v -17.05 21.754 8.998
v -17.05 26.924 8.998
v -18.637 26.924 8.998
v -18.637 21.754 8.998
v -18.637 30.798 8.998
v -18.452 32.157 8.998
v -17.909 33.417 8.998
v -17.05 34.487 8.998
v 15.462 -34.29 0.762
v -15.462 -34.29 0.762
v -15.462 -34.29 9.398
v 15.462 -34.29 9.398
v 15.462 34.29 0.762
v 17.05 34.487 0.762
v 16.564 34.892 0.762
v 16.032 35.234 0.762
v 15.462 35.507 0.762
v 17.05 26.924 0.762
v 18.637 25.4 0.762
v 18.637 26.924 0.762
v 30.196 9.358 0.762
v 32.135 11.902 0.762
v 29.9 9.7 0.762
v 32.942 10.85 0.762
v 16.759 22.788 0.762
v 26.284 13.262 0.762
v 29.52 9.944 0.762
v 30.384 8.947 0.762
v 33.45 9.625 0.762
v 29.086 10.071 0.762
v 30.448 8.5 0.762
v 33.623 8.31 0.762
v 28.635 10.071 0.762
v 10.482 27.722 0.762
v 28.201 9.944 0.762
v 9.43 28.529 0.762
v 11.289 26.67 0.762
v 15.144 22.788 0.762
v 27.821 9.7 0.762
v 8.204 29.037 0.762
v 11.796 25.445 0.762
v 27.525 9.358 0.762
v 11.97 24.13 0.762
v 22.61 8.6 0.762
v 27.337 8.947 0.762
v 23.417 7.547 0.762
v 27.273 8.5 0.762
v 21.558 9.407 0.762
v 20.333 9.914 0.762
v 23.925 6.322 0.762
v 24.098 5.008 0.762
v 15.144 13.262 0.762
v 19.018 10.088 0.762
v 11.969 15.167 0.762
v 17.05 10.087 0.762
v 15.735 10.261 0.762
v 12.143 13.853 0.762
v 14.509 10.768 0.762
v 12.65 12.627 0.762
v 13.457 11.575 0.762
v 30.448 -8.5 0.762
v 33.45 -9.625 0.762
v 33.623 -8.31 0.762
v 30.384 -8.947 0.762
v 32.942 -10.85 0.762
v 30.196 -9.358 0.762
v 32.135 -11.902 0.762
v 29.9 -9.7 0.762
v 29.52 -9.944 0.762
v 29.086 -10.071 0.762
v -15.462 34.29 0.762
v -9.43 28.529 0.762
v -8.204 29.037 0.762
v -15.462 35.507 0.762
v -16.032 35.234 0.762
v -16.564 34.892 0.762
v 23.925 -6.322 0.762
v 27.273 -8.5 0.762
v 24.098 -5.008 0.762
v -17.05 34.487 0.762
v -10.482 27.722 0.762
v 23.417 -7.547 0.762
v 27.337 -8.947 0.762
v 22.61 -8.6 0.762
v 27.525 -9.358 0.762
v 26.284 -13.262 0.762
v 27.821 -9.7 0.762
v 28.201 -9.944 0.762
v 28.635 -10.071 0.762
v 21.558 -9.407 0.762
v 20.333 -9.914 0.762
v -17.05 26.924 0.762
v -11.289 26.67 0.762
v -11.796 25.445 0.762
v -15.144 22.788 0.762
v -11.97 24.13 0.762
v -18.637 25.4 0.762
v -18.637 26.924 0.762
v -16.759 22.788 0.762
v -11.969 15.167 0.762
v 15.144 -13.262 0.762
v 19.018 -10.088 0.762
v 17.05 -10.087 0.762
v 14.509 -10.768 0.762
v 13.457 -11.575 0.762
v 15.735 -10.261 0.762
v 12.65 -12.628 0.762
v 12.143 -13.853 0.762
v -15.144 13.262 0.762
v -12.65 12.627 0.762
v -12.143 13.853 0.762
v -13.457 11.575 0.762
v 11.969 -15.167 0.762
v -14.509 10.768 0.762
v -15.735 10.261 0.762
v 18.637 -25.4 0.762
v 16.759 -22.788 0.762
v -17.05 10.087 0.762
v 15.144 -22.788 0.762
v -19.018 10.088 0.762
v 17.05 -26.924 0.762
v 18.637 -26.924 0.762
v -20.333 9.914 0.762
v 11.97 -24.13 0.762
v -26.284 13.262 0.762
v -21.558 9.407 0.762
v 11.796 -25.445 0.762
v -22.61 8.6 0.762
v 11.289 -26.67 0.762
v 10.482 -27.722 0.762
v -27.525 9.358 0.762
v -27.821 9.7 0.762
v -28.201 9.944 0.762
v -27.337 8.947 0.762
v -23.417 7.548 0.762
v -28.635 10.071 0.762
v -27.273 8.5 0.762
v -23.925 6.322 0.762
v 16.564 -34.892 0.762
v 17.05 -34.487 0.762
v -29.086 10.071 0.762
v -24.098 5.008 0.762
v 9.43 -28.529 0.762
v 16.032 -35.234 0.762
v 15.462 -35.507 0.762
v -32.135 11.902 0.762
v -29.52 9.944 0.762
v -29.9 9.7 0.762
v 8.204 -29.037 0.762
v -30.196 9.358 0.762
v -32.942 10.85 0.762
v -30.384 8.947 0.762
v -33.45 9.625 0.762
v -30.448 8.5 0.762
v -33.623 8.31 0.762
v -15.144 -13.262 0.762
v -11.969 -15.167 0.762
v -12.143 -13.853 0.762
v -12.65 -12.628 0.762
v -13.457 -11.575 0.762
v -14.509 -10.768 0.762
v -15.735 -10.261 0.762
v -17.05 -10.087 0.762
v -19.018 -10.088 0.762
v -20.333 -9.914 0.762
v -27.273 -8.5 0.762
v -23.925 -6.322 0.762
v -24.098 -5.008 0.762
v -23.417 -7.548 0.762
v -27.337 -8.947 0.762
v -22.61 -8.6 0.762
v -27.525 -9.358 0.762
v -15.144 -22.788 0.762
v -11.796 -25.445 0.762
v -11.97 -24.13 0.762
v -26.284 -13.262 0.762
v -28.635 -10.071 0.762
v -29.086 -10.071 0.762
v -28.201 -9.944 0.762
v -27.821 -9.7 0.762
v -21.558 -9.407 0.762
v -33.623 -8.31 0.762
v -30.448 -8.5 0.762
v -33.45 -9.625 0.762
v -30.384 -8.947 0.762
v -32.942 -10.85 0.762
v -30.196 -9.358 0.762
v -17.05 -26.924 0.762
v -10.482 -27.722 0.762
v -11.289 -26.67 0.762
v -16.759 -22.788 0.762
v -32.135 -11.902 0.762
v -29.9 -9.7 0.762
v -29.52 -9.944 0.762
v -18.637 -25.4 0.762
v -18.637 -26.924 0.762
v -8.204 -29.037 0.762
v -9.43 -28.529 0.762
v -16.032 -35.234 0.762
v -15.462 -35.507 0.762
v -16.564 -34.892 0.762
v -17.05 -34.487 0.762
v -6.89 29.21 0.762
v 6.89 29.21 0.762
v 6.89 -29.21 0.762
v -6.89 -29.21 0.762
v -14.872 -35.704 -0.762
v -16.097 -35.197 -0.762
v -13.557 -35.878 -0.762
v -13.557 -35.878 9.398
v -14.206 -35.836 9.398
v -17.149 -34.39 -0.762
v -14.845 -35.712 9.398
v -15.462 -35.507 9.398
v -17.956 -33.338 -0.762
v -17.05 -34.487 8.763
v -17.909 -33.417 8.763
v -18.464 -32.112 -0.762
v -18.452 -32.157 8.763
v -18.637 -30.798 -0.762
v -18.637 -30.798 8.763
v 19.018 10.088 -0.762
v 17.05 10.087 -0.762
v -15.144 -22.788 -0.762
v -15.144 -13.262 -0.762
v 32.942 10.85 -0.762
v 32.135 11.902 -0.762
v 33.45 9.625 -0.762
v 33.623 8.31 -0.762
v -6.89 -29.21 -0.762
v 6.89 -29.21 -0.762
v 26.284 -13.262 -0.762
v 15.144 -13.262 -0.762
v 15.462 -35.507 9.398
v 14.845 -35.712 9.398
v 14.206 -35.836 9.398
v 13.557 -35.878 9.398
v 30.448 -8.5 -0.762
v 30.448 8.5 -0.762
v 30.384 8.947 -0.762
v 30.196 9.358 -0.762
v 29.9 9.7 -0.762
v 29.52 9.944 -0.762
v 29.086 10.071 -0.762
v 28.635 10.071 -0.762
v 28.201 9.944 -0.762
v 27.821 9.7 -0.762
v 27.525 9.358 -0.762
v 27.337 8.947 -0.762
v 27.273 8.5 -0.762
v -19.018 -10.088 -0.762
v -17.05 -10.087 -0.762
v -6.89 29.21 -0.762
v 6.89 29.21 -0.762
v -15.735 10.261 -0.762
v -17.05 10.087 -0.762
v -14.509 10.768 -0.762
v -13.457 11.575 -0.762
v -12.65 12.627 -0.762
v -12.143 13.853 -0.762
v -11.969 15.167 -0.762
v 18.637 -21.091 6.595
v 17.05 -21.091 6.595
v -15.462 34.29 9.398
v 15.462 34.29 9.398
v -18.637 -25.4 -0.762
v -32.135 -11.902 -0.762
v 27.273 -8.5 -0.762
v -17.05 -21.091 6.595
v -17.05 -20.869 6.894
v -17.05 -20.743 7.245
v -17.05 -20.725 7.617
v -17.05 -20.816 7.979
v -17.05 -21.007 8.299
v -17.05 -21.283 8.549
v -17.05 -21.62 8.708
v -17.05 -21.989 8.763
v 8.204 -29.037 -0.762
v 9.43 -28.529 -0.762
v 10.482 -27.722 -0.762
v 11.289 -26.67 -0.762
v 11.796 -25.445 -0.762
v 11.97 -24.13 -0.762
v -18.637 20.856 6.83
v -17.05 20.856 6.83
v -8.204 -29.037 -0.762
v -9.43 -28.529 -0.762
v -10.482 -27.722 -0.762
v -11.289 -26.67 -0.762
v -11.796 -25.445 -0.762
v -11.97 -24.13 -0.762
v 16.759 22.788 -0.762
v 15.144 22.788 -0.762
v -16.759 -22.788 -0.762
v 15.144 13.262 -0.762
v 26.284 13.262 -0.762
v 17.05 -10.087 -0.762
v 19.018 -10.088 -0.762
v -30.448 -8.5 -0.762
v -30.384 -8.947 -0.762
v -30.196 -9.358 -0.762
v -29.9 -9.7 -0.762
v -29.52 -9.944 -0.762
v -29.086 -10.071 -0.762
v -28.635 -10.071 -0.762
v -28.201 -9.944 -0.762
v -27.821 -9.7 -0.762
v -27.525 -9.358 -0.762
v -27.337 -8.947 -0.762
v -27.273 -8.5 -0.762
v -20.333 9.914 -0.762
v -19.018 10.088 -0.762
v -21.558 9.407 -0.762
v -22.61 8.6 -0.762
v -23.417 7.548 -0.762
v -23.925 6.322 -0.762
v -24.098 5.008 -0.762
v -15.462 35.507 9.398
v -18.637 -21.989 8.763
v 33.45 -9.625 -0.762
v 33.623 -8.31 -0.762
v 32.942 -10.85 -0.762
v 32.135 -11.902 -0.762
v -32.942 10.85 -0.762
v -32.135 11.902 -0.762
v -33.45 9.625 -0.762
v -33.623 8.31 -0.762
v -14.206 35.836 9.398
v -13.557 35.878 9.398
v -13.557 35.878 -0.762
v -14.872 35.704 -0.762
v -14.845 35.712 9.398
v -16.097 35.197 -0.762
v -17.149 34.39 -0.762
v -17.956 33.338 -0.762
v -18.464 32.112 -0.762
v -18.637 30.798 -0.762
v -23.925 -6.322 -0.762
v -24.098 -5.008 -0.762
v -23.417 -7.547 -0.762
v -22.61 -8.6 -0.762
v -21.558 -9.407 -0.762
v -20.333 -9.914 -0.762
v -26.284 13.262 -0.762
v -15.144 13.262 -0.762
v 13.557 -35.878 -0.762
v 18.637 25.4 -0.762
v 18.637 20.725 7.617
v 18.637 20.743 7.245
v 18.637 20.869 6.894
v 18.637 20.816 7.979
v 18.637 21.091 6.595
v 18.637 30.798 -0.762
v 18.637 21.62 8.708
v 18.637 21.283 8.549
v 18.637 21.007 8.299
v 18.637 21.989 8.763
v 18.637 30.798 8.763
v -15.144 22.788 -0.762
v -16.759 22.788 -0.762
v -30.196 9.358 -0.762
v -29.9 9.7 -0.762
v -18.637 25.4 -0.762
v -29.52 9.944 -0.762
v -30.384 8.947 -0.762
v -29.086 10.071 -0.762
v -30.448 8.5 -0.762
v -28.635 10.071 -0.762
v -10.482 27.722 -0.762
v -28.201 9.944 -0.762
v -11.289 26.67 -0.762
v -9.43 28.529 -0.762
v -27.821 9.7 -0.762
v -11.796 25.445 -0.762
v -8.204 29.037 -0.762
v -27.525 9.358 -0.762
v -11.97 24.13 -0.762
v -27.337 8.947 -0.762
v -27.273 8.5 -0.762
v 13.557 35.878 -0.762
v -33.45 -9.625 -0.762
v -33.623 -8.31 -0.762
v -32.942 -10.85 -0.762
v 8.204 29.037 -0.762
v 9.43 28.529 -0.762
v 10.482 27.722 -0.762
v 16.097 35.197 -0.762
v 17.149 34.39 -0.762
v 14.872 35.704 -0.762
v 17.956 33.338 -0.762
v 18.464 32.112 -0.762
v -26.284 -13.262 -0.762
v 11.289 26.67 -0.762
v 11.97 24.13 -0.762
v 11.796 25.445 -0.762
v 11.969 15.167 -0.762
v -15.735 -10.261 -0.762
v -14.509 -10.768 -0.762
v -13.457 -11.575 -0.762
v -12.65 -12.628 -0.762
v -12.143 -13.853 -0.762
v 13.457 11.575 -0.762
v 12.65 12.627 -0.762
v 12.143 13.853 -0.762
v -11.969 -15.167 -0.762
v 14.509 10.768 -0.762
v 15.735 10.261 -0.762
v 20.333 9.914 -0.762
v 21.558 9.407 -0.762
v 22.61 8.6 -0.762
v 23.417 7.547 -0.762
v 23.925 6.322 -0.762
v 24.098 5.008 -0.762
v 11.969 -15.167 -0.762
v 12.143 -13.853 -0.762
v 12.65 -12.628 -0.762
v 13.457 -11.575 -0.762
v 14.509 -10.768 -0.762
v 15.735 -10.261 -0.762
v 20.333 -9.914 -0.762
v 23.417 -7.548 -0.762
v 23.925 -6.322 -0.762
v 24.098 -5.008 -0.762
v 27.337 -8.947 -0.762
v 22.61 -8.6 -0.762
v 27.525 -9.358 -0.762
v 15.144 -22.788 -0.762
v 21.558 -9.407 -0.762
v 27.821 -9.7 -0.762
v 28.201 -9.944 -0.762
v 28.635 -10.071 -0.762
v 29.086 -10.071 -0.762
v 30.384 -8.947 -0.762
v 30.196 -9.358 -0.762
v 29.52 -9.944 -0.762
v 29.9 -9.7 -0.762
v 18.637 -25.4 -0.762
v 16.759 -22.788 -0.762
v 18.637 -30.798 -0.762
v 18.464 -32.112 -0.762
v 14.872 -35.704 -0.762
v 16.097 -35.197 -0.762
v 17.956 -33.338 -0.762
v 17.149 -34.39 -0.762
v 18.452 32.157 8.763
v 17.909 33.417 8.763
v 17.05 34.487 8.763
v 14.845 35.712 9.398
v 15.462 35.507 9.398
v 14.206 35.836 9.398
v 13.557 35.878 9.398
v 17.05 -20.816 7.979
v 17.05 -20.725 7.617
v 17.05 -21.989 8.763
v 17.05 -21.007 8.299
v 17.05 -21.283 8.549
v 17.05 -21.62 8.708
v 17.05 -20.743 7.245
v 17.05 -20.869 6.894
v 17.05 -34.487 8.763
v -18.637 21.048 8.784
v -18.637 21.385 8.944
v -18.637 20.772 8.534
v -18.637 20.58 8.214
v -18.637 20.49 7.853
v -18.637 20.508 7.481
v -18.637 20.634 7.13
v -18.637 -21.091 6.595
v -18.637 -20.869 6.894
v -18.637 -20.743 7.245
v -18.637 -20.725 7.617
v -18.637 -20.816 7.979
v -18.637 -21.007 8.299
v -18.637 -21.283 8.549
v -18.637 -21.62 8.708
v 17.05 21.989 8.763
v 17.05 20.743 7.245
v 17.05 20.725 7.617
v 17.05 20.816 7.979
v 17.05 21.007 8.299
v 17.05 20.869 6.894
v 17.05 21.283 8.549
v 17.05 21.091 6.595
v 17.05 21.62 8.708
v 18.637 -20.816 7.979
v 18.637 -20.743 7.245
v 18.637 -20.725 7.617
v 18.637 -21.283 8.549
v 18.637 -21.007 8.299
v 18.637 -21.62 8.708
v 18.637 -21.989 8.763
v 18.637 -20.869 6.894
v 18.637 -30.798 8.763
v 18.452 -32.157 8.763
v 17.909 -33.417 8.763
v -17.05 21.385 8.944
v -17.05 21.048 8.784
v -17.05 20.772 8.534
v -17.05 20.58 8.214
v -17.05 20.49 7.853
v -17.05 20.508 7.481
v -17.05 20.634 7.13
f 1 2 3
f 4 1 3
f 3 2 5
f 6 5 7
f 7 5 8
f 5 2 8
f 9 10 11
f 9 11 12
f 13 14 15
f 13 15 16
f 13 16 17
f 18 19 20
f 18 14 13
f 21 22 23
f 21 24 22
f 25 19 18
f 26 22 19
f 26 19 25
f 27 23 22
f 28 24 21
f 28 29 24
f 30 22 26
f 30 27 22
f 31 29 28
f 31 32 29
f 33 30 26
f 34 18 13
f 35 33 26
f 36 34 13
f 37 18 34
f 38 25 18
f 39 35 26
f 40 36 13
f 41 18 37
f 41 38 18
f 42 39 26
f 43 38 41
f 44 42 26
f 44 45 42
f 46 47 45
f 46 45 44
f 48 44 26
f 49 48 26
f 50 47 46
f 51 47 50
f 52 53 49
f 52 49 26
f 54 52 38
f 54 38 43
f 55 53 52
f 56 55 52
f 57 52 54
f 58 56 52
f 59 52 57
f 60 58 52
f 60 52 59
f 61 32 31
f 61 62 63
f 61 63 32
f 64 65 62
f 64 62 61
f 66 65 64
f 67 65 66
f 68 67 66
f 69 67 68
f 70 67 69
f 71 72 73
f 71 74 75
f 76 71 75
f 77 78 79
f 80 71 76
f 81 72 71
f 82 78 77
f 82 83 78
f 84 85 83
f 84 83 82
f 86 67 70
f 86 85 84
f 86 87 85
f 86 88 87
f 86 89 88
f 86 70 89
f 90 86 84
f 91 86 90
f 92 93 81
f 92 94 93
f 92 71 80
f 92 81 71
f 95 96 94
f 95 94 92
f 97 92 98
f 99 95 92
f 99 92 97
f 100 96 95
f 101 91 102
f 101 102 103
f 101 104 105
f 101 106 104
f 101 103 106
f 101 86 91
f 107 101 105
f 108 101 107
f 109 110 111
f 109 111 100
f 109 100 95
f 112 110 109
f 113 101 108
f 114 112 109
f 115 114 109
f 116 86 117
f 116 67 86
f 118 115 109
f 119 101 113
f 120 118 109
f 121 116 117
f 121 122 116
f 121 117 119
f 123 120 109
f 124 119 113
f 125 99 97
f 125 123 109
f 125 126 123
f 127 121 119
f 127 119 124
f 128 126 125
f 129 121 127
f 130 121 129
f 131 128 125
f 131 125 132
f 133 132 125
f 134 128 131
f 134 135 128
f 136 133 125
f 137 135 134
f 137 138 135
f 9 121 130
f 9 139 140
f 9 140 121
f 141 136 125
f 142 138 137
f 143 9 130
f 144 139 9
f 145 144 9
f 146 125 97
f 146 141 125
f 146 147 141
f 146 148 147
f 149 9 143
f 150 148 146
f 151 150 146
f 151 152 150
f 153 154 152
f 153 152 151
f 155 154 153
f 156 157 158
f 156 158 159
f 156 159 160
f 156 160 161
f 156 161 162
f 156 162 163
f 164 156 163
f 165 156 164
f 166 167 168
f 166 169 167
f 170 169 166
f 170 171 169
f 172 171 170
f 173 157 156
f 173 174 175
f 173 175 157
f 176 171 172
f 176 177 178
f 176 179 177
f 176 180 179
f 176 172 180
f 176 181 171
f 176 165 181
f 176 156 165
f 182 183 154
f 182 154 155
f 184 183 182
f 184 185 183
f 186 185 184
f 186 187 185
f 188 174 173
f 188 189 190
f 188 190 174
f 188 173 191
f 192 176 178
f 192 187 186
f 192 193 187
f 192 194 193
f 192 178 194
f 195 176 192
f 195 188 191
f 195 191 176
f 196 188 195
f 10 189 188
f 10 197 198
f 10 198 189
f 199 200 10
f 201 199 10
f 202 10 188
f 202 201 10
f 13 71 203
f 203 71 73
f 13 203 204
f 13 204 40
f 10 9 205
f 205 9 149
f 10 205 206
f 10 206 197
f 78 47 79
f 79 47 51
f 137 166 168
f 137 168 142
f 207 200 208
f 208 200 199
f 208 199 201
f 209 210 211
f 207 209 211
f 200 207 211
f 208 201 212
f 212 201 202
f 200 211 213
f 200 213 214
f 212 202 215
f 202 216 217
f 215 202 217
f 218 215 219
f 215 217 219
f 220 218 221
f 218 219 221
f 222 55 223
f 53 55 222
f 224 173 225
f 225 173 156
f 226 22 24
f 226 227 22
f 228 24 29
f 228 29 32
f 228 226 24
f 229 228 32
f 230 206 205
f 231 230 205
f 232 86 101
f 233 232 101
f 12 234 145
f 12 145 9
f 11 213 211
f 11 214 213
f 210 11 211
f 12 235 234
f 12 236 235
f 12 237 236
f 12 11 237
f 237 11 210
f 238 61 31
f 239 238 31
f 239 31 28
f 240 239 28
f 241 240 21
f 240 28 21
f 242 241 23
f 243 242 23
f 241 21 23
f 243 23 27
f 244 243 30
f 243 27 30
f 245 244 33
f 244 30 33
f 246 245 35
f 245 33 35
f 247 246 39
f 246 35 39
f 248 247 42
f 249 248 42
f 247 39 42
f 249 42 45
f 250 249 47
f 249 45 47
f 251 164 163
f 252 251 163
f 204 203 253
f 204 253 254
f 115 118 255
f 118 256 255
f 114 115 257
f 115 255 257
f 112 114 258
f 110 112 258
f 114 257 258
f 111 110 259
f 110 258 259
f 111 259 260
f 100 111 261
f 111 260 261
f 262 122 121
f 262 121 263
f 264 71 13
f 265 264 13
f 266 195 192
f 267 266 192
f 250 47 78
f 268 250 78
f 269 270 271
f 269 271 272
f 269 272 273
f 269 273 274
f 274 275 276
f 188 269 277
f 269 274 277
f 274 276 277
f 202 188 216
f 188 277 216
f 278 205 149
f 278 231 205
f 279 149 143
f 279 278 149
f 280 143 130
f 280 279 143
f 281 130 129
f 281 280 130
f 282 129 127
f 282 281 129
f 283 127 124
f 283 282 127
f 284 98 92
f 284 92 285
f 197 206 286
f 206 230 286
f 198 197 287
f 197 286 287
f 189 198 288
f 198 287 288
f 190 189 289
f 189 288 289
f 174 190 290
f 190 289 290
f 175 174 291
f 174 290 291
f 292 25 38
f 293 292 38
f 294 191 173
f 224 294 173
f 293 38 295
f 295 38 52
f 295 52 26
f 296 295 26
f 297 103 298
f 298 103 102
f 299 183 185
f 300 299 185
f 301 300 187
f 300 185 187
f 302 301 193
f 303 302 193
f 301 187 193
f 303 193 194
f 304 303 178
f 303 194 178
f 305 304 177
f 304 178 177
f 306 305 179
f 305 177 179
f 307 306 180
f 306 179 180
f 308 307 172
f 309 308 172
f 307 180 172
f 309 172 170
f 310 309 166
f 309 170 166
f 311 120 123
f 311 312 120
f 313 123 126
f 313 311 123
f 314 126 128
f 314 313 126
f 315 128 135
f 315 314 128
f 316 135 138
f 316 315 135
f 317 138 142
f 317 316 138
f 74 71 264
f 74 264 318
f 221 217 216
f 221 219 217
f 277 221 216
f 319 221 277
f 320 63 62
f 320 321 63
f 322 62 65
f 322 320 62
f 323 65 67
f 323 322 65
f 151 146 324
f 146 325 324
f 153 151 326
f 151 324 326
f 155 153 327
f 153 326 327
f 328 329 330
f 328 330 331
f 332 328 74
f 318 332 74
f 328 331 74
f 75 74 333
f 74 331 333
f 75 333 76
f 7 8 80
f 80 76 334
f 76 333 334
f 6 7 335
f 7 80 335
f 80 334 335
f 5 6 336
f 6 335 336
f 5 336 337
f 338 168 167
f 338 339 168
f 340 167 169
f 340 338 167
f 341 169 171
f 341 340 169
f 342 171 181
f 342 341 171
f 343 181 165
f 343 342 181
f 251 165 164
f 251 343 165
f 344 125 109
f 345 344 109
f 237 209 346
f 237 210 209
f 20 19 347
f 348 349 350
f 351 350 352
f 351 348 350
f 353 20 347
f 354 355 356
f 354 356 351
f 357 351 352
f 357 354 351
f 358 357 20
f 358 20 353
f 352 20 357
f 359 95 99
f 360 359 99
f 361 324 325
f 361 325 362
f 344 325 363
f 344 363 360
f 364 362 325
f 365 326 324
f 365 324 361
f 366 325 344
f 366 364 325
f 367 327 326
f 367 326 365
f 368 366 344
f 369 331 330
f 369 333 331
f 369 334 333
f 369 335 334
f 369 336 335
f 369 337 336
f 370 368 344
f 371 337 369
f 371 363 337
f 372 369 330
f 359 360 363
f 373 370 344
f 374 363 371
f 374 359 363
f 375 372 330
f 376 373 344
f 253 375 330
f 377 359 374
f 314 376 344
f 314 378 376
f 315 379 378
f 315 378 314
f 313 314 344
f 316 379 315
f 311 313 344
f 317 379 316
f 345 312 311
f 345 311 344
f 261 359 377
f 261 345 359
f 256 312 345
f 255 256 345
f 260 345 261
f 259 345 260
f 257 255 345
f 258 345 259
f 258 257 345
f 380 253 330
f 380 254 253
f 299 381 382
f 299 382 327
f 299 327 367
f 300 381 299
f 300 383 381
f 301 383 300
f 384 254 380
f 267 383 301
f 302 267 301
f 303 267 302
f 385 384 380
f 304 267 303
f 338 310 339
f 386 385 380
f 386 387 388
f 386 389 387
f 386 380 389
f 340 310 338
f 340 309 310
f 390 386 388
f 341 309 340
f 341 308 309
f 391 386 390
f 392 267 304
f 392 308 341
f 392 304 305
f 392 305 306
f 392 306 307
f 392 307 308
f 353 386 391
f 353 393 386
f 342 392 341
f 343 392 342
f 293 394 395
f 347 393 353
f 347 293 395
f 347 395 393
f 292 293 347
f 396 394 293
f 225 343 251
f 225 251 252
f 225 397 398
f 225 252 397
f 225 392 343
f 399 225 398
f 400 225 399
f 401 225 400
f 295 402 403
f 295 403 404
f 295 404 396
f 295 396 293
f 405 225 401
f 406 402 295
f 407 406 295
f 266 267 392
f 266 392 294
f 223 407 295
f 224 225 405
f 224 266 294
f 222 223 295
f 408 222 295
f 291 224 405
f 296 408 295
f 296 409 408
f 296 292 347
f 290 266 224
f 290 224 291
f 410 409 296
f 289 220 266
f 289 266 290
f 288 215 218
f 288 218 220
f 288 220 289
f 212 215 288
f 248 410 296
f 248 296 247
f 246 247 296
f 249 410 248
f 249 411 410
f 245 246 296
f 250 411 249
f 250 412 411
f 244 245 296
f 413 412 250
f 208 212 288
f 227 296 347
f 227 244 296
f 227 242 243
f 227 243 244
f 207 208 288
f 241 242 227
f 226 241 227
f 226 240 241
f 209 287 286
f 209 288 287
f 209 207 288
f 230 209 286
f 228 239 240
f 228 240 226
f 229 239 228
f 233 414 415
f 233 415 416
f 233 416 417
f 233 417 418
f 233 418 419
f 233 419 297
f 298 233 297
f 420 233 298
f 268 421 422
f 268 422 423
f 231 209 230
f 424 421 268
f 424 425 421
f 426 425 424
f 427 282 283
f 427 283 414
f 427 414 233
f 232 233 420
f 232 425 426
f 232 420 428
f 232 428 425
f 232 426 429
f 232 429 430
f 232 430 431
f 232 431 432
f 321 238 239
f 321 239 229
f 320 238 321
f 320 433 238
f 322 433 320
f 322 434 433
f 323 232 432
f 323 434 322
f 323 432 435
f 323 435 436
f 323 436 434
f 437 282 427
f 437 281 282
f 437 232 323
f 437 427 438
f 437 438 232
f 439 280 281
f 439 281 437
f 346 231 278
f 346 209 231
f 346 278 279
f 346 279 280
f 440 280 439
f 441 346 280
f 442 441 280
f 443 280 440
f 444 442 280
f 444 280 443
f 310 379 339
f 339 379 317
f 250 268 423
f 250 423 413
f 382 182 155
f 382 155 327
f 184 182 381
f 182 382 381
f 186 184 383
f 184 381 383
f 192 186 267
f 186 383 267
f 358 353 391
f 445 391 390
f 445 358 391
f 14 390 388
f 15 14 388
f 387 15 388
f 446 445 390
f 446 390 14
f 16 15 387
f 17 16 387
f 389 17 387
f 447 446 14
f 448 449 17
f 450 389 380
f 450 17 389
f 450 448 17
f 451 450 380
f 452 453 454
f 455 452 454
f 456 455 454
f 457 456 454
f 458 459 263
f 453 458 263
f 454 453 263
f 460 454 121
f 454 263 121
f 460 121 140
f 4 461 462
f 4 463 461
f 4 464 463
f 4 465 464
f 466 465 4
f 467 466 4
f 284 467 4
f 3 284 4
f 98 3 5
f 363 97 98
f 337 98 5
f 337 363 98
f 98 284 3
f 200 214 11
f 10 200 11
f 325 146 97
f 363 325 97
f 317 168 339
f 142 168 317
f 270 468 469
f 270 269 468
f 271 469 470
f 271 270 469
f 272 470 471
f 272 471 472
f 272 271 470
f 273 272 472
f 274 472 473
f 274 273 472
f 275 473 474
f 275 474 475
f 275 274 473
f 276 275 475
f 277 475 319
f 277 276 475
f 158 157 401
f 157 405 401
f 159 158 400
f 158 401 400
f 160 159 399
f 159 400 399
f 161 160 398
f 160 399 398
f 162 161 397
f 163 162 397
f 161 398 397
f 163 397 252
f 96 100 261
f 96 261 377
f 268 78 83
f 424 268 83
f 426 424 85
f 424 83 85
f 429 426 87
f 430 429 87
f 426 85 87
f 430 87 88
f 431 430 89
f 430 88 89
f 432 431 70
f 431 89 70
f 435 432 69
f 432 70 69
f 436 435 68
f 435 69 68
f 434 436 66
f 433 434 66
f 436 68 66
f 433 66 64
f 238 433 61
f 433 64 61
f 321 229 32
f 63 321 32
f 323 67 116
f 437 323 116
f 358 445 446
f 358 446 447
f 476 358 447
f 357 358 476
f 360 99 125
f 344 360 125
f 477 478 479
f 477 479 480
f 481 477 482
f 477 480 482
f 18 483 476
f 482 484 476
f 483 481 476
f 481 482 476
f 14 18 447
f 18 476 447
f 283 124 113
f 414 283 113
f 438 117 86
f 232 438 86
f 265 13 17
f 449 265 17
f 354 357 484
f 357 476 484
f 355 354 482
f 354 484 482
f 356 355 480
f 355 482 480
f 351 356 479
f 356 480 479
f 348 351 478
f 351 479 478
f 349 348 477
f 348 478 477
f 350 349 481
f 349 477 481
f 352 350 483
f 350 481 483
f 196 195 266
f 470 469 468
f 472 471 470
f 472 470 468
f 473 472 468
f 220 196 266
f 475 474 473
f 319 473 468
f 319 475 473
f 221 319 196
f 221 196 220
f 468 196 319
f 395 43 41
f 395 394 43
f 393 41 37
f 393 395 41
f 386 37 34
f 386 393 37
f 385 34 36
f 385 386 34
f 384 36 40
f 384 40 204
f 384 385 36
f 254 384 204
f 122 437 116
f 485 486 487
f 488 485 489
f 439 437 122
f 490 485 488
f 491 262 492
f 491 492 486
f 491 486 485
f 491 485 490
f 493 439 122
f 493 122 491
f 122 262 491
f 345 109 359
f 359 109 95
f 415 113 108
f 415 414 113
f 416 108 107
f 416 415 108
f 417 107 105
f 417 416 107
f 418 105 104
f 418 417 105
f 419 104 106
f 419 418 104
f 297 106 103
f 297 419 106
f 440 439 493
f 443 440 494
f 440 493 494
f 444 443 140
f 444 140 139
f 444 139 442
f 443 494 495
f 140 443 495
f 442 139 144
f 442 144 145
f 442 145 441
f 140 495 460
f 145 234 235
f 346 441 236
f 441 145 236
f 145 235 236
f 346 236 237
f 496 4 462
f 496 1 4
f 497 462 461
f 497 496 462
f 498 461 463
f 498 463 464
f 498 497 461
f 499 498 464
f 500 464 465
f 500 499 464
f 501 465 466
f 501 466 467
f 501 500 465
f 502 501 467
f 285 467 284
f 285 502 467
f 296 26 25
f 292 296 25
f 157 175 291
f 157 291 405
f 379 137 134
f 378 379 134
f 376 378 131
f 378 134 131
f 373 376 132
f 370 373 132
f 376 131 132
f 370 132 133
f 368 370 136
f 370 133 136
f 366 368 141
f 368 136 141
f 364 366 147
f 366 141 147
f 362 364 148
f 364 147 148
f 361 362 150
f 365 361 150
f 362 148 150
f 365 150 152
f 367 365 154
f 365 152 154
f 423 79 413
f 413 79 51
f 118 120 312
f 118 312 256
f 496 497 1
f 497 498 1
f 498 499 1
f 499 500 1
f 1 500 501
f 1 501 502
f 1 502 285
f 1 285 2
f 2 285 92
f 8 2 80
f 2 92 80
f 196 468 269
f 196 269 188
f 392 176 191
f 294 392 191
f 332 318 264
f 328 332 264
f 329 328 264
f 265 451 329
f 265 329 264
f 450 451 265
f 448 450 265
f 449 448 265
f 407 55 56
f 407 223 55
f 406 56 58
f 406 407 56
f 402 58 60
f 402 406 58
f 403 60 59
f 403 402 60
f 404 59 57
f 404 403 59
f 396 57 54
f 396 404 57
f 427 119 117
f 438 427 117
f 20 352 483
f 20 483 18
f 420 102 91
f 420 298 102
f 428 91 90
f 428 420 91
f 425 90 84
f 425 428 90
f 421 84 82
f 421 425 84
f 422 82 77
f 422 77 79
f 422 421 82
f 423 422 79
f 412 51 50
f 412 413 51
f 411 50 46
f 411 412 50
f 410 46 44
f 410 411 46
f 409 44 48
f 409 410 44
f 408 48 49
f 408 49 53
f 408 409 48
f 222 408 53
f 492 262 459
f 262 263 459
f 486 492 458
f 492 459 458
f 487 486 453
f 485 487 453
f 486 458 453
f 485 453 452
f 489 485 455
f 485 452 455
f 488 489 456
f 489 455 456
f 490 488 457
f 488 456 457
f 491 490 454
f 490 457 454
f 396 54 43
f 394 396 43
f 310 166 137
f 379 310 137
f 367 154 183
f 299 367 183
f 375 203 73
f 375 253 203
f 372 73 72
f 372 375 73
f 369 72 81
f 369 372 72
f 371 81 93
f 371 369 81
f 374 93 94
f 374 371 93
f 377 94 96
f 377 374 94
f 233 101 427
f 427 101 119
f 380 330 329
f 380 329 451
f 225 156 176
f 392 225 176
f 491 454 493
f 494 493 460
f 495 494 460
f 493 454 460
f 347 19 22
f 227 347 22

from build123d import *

# Parameters (mm, degrees)
F1_DEPTH        = 35.8775
F3_DEPTH        = 25.4
F4_W            = 1.5875
F4_H            = 8.9535
F5_DEPTH        = 9.525
F6_W            = 30.924
F6_H            = 1.5875
F5_FACE_W       = 1.5875
F5_FACE_H       = 8.9535
F7_DEPTH        = 8.636
F8_W            = 4.9497522414
F8_H            = 7.6485192403
F9_DEPTH        = 71.756
F10_W           = 23.939
F10_H           = 58.42
F11_DEPTH       = 1.525
F13_DEPTH       = 25.4
F14_W           = 12.1285
F14_H           = 20.175
F15_DEPTH       = 25.4
F16_F1_R        = 5.08
F16_F2_R        = 5.08
F16_S1_T1_DEPTH = 26.1520932665
F18_DEPTH       = 25.4
F20_DEPTH       = 1.5875
F22_DEPTH       = 1.5875
F23_R           = 1.27
F24_W           = 14.2291039228
F24_H           = 17.7929829806
F25_DEPTH       = 2.54


# Not quite as in the source:
# - a fillet or chamfer that OpenCascade refuses, or shapes differently, is made with other operations: its cross-section is extruded or revolved along the edge and cut away or added


with BuildPart() as f1:
    # F0 (on Front) → F1 (new body, symmetric)
    with BuildSketch(Plane.XZ):
        Polygon((17.875, 0.762), (-17.875, 0.762), (-18.637, 0.762), (-18.637, 0), (-18.637, -0.762), (18.637, -0.762), (18.637, 0), (18.637, 0.762), align=None)
    extrude(amount=F1_DEPTH, both=True)

    # F2 (on Front) → F3 (join, symmetric)
    with BuildSketch(Plane.XZ):
        Polygon((33.623, 0.762), (20.923, 0.762), (18.637, 0.762), (18.637, -0.762), (33.623, -0.762), align=None)
        Polygon((-18.637, 0.762), (-20.923, 0.762), (-33.623, 0.762), (-33.623, -0.762), (-18.637, -0.762), (-18.637, 0), align=None)
    extrude(amount=F3_DEPTH, both=True)

    # F4 (on face) → F5 (join)
    with BuildSketch(Plane(origin=(0, 0, -0.762), x_dir=(1, 0, 0), z_dir=(0, 0, -1))):
        with Locations((-17.84325, 31.40075)):
            Rectangle(F4_W, F4_H)
        with Locations((17.84325, 31.40075)):
            Rectangle(F4_W, F4_H)
        with Locations((-17.84325, -31.40075)):
            Rectangle(F4_W, F4_H)
        with Locations((17.84325, -31.40075)):
            Rectangle(F4_W, F4_H)
    extrude(amount=-F5_DEPTH)

    # F6 (on face) + F5_face (on face) → F7 (join)
    with BuildSketch(Plane.XY.offset(0.762)):
        with Locations((0, 35.08375)):
            Rectangle(F6_W, F6_H)
        with Locations((0, -35.08375)):
            Rectangle(F6_W, F6_H)
    with BuildSketch(Plane(origin=(-17.84325, 31.40075, 8.763), x_dir=(1, 0, 0), z_dir=(0, 0, 1))):
        Rectangle(F5_FACE_W, F5_FACE_H)
    extrude(amount=F7_DEPTH)

    # F8 (on face) → F9 (cut, through all)
    with BuildSketch(Plane(origin=(0, 35.8775, 0), x_dir=(-1, 0, 0), z_dir=(0, 1, 0))):
        with Locations((18.5586120933, 12.8226471134)):
            Rectangle(F8_W, F8_H)
    extrude(amount=-F9_DEPTH, mode=Mode.SUBTRACT)

    # F10 (on face) → F11 (cut, through all)
    with BuildSketch(Plane.XY.offset(0.762)):
        with BuildLine():
            ThreePointArc((-30.448, -8.5), (-28.8605, -10.0875), (-27.273, -8.5))
            Line((-27.273, -8.5), (-27.273, 8.5))
            ThreePointArc((-27.273, 8.5), (-28.8605, 10.0875), (-30.448, 8.5))
            Line((-30.448, 8.5), (-30.448, -8.5))
        make_face()
        with BuildLine():
            Line((27.273, 8.5), (27.273, -8.5))
            ThreePointArc((27.273, -8.5), (28.8605, -10.0875), (30.448, -8.5))
            Line((30.448, -8.5), (30.448, 8.5))
            ThreePointArc((30.448, 8.5), (28.8605, 10.0875), (27.273, 8.5))
        make_face()
        Rectangle(F10_W, F10_H)
    extrude(amount=-F11_DEPTH, mode=Mode.SUBTRACT)

    # F12 (on face) → F13 (cut)
    with BuildSketch(Plane.XY.offset(0.762)):
        Polygon((33.623, 25.4), (18.637, 25.4), (33.623, 10.414), align=None)
        Polygon((33.623, -10.414), (18.637, -25.4), (33.623, -25.4), align=None)
        Polygon((-18.637, 25.4), (-33.623, 25.4), (-33.623, 10.414), align=None)
        Polygon((-33.623, -10.414), (-33.623, -25.4), (-18.637, -25.4), align=None)
    extrude(amount=-F13_DEPTH, mode=Mode.SUBTRACT)

    # F14 (on face) → F15 (cut)
    with BuildSketch(Plane.XY.offset(0.762)):
        with Locations((-18.03375, 0)):
            Rectangle(F14_W, F14_H)
        with Locations((18.03375, 0)):
            Rectangle(F14_W, F14_H)
        Polygon((-15.1445, 16.4375), (-23.1093719395, 16.4375), (-26.2843719395, 13.2625), (-15.1445, 13.2625), align=None)
        Polygon((-19.9343719395, 19.6125), (-16.7593719395, 19.6125), (-15.1445, 19.6125), (-15.1445, 22.7875), (-16.7593719395, 22.7875), align=None)
        Polygon((16.7593719395, 19.6125), (19.9343719395, 19.6125), (16.7593719395, 22.7875), (15.1445, 22.7875), (15.1445, 19.6125), align=None)
        Polygon((23.1093719395, 16.4375), (15.1445, 16.4375), (15.1445, 13.2625), (26.2843719395, 13.2625), align=None)
        Polygon((26.2843719395, -13.2625), (15.1445, -13.2625), (15.1445, -16.4375), (23.1093719395, -16.4375), align=None)
        Polygon((16.7593719395, -22.7875), (19.9343719395, -19.6125), (16.7593719395, -19.6125), (15.1445, -19.6125), (15.1445, -22.7875), align=None)
        Polygon((-15.1445, -13.2625), (-26.2843719395, -13.2625), (-23.1093719395, -16.4375), (-15.1445, -16.4375), align=None)
        Polygon((-15.1445, -19.6125), (-16.7593719395, -19.6125), (-19.9343719395, -19.6125), (-16.7593719395, -22.7875), (-15.1445, -22.7875), align=None)
    extrude(amount=-F15_DEPTH, mode=Mode.SUBTRACT)

    # F16: fillet of radius 5.08 on 20 edges, made by hand

    # F16_f1
    f16_f1_edges = [f1.edges().sort_by_distance(p)[0] for p in [
        (-24.098, 10.0875, 0),
        (-24.098, -10.0875, 0),
        (-11.9695, 29.21, 0),
        (11.9695, 29.21, 0),
        (24.098, 10.0875, 0),
        (24.098, -10.0875, 0),
        (11.9695, -29.21, 0),
        (-11.9695, -29.21, 0),
    ]]
    fillet(f16_f1_edges, radius=F16_F1_R)

    # F16_f2
    f16_f2_edges = [f1.edges().sort_by_distance(p)[0] for p in [
        (-33.623, -10.414, 0),
        (-33.623, 10.414, 0),
        (-11.9695, -10.0875, 0),
        (-11.9695, 10.0875, 0),
        (11.9695, 10.0875, 0),
        (11.9695, -10.0875, 0),
        (33.623, -10.414, 0),
        (33.623, 10.414, 0),
        (18.637, 35.8775, 4.0005),
        (-18.637, 35.8775, 4.1181937466),
        (18.637, -35.8775, 4.0005),
        (-18.637, -35.8775, 4.0005),
    ]]
    fillet(f16_f2_edges, radius=F16_F2_R)

    # F16#s1: fillet of radius 5.08 on 1 edges, made by hand

    # F16_s1_s2 → F16_s1_t1 (cut)
    with BuildSketch(Plane.XY.offset(3.9469067335)):
        with BuildLine():
            ThreePointArc((-13.557, 35.8775), (-17.1491024484, 34.3896024484), (-18.637, 30.7975))
            Line((-18.637, 30.7975), (-18.637, 35.8775))
            Line((-18.637, 35.8775), (-13.557, 35.8775))
        make_face()
    extrude(amount=F16_S1_T1_DEPTH, mode=Mode.SUBTRACT)

    # F17 (on face) → F18 (cut)
    with BuildSketch(Plane.XY.offset(0.762)):
        Polygon((-15.1445, 19.6125), (-19.9343719395, 19.6125), (-23.1093719395, 16.4375), (-15.1445, 16.4375), align=None)
        Polygon((19.9343719395, 19.6125), (15.1445, 19.6125), (15.1445, 16.4375), (23.1093719395, 16.4375), align=None)
        Polygon((23.1093719395, -16.4375), (15.1445, -16.4375), (15.1445, -19.6125), (19.9343719395, -19.6125), align=None)
        Polygon((-15.1445, -16.4375), (-23.1093719395, -16.4375), (-19.9343719395, -19.6125), (-15.1445, -19.6125), align=None)
    extrude(amount=-F18_DEPTH, mode=Mode.SUBTRACT)

    # F19 (on face) → F20 (join)
    with BuildSketch(Plane.YZ.offset(18.637)):
        Polygon((18.923, 8.763), (26.924, 0.762), (26.924, 8.763), align=None)
        Polygon((-26.924, 8.763), (-26.924, 0.762), (-18.923, 8.763), align=None)
    extrude(amount=-F20_DEPTH)

    # F21 (on face) → F22 (join)
    with BuildSketch(Plane(origin=(-18.637, 0, 0), x_dir=(0, -1, 0), z_dir=(-1, 0, 0))):
        Polygon((18.923, 8.763), (26.924, 0.762), (26.924, 8.763), align=None)
        Polygon((-26.924, 8.9983874932), (-26.924, 0.762), (-18.6876125068, 8.9983874932), align=None)
    extrude(amount=-F22_DEPTH)

    # F23
    f23_edges = [f1.edges().sort_by_distance(p)[0] for p in [
        (-17.84325, 18.687613, 8.998387),
        (-17.84325, -18.923, 8.763),
        (17.84325, -18.923, 8.763),
        (17.84325, 18.923, 8.763),
    ]]
    fillet(f23_edges, radius=F23_R)

    # F24 (on face) → F25 (cut)
    with BuildSketch(Plane.XY.offset(17.399)):
        with Locations((-13.9599367976, 29.4290939346)):
            Rectangle(F24_W, F24_H)
    extrude(amount=-F25_DEPTH, mode=Mode.SUBTRACT)


solid = f1.part
